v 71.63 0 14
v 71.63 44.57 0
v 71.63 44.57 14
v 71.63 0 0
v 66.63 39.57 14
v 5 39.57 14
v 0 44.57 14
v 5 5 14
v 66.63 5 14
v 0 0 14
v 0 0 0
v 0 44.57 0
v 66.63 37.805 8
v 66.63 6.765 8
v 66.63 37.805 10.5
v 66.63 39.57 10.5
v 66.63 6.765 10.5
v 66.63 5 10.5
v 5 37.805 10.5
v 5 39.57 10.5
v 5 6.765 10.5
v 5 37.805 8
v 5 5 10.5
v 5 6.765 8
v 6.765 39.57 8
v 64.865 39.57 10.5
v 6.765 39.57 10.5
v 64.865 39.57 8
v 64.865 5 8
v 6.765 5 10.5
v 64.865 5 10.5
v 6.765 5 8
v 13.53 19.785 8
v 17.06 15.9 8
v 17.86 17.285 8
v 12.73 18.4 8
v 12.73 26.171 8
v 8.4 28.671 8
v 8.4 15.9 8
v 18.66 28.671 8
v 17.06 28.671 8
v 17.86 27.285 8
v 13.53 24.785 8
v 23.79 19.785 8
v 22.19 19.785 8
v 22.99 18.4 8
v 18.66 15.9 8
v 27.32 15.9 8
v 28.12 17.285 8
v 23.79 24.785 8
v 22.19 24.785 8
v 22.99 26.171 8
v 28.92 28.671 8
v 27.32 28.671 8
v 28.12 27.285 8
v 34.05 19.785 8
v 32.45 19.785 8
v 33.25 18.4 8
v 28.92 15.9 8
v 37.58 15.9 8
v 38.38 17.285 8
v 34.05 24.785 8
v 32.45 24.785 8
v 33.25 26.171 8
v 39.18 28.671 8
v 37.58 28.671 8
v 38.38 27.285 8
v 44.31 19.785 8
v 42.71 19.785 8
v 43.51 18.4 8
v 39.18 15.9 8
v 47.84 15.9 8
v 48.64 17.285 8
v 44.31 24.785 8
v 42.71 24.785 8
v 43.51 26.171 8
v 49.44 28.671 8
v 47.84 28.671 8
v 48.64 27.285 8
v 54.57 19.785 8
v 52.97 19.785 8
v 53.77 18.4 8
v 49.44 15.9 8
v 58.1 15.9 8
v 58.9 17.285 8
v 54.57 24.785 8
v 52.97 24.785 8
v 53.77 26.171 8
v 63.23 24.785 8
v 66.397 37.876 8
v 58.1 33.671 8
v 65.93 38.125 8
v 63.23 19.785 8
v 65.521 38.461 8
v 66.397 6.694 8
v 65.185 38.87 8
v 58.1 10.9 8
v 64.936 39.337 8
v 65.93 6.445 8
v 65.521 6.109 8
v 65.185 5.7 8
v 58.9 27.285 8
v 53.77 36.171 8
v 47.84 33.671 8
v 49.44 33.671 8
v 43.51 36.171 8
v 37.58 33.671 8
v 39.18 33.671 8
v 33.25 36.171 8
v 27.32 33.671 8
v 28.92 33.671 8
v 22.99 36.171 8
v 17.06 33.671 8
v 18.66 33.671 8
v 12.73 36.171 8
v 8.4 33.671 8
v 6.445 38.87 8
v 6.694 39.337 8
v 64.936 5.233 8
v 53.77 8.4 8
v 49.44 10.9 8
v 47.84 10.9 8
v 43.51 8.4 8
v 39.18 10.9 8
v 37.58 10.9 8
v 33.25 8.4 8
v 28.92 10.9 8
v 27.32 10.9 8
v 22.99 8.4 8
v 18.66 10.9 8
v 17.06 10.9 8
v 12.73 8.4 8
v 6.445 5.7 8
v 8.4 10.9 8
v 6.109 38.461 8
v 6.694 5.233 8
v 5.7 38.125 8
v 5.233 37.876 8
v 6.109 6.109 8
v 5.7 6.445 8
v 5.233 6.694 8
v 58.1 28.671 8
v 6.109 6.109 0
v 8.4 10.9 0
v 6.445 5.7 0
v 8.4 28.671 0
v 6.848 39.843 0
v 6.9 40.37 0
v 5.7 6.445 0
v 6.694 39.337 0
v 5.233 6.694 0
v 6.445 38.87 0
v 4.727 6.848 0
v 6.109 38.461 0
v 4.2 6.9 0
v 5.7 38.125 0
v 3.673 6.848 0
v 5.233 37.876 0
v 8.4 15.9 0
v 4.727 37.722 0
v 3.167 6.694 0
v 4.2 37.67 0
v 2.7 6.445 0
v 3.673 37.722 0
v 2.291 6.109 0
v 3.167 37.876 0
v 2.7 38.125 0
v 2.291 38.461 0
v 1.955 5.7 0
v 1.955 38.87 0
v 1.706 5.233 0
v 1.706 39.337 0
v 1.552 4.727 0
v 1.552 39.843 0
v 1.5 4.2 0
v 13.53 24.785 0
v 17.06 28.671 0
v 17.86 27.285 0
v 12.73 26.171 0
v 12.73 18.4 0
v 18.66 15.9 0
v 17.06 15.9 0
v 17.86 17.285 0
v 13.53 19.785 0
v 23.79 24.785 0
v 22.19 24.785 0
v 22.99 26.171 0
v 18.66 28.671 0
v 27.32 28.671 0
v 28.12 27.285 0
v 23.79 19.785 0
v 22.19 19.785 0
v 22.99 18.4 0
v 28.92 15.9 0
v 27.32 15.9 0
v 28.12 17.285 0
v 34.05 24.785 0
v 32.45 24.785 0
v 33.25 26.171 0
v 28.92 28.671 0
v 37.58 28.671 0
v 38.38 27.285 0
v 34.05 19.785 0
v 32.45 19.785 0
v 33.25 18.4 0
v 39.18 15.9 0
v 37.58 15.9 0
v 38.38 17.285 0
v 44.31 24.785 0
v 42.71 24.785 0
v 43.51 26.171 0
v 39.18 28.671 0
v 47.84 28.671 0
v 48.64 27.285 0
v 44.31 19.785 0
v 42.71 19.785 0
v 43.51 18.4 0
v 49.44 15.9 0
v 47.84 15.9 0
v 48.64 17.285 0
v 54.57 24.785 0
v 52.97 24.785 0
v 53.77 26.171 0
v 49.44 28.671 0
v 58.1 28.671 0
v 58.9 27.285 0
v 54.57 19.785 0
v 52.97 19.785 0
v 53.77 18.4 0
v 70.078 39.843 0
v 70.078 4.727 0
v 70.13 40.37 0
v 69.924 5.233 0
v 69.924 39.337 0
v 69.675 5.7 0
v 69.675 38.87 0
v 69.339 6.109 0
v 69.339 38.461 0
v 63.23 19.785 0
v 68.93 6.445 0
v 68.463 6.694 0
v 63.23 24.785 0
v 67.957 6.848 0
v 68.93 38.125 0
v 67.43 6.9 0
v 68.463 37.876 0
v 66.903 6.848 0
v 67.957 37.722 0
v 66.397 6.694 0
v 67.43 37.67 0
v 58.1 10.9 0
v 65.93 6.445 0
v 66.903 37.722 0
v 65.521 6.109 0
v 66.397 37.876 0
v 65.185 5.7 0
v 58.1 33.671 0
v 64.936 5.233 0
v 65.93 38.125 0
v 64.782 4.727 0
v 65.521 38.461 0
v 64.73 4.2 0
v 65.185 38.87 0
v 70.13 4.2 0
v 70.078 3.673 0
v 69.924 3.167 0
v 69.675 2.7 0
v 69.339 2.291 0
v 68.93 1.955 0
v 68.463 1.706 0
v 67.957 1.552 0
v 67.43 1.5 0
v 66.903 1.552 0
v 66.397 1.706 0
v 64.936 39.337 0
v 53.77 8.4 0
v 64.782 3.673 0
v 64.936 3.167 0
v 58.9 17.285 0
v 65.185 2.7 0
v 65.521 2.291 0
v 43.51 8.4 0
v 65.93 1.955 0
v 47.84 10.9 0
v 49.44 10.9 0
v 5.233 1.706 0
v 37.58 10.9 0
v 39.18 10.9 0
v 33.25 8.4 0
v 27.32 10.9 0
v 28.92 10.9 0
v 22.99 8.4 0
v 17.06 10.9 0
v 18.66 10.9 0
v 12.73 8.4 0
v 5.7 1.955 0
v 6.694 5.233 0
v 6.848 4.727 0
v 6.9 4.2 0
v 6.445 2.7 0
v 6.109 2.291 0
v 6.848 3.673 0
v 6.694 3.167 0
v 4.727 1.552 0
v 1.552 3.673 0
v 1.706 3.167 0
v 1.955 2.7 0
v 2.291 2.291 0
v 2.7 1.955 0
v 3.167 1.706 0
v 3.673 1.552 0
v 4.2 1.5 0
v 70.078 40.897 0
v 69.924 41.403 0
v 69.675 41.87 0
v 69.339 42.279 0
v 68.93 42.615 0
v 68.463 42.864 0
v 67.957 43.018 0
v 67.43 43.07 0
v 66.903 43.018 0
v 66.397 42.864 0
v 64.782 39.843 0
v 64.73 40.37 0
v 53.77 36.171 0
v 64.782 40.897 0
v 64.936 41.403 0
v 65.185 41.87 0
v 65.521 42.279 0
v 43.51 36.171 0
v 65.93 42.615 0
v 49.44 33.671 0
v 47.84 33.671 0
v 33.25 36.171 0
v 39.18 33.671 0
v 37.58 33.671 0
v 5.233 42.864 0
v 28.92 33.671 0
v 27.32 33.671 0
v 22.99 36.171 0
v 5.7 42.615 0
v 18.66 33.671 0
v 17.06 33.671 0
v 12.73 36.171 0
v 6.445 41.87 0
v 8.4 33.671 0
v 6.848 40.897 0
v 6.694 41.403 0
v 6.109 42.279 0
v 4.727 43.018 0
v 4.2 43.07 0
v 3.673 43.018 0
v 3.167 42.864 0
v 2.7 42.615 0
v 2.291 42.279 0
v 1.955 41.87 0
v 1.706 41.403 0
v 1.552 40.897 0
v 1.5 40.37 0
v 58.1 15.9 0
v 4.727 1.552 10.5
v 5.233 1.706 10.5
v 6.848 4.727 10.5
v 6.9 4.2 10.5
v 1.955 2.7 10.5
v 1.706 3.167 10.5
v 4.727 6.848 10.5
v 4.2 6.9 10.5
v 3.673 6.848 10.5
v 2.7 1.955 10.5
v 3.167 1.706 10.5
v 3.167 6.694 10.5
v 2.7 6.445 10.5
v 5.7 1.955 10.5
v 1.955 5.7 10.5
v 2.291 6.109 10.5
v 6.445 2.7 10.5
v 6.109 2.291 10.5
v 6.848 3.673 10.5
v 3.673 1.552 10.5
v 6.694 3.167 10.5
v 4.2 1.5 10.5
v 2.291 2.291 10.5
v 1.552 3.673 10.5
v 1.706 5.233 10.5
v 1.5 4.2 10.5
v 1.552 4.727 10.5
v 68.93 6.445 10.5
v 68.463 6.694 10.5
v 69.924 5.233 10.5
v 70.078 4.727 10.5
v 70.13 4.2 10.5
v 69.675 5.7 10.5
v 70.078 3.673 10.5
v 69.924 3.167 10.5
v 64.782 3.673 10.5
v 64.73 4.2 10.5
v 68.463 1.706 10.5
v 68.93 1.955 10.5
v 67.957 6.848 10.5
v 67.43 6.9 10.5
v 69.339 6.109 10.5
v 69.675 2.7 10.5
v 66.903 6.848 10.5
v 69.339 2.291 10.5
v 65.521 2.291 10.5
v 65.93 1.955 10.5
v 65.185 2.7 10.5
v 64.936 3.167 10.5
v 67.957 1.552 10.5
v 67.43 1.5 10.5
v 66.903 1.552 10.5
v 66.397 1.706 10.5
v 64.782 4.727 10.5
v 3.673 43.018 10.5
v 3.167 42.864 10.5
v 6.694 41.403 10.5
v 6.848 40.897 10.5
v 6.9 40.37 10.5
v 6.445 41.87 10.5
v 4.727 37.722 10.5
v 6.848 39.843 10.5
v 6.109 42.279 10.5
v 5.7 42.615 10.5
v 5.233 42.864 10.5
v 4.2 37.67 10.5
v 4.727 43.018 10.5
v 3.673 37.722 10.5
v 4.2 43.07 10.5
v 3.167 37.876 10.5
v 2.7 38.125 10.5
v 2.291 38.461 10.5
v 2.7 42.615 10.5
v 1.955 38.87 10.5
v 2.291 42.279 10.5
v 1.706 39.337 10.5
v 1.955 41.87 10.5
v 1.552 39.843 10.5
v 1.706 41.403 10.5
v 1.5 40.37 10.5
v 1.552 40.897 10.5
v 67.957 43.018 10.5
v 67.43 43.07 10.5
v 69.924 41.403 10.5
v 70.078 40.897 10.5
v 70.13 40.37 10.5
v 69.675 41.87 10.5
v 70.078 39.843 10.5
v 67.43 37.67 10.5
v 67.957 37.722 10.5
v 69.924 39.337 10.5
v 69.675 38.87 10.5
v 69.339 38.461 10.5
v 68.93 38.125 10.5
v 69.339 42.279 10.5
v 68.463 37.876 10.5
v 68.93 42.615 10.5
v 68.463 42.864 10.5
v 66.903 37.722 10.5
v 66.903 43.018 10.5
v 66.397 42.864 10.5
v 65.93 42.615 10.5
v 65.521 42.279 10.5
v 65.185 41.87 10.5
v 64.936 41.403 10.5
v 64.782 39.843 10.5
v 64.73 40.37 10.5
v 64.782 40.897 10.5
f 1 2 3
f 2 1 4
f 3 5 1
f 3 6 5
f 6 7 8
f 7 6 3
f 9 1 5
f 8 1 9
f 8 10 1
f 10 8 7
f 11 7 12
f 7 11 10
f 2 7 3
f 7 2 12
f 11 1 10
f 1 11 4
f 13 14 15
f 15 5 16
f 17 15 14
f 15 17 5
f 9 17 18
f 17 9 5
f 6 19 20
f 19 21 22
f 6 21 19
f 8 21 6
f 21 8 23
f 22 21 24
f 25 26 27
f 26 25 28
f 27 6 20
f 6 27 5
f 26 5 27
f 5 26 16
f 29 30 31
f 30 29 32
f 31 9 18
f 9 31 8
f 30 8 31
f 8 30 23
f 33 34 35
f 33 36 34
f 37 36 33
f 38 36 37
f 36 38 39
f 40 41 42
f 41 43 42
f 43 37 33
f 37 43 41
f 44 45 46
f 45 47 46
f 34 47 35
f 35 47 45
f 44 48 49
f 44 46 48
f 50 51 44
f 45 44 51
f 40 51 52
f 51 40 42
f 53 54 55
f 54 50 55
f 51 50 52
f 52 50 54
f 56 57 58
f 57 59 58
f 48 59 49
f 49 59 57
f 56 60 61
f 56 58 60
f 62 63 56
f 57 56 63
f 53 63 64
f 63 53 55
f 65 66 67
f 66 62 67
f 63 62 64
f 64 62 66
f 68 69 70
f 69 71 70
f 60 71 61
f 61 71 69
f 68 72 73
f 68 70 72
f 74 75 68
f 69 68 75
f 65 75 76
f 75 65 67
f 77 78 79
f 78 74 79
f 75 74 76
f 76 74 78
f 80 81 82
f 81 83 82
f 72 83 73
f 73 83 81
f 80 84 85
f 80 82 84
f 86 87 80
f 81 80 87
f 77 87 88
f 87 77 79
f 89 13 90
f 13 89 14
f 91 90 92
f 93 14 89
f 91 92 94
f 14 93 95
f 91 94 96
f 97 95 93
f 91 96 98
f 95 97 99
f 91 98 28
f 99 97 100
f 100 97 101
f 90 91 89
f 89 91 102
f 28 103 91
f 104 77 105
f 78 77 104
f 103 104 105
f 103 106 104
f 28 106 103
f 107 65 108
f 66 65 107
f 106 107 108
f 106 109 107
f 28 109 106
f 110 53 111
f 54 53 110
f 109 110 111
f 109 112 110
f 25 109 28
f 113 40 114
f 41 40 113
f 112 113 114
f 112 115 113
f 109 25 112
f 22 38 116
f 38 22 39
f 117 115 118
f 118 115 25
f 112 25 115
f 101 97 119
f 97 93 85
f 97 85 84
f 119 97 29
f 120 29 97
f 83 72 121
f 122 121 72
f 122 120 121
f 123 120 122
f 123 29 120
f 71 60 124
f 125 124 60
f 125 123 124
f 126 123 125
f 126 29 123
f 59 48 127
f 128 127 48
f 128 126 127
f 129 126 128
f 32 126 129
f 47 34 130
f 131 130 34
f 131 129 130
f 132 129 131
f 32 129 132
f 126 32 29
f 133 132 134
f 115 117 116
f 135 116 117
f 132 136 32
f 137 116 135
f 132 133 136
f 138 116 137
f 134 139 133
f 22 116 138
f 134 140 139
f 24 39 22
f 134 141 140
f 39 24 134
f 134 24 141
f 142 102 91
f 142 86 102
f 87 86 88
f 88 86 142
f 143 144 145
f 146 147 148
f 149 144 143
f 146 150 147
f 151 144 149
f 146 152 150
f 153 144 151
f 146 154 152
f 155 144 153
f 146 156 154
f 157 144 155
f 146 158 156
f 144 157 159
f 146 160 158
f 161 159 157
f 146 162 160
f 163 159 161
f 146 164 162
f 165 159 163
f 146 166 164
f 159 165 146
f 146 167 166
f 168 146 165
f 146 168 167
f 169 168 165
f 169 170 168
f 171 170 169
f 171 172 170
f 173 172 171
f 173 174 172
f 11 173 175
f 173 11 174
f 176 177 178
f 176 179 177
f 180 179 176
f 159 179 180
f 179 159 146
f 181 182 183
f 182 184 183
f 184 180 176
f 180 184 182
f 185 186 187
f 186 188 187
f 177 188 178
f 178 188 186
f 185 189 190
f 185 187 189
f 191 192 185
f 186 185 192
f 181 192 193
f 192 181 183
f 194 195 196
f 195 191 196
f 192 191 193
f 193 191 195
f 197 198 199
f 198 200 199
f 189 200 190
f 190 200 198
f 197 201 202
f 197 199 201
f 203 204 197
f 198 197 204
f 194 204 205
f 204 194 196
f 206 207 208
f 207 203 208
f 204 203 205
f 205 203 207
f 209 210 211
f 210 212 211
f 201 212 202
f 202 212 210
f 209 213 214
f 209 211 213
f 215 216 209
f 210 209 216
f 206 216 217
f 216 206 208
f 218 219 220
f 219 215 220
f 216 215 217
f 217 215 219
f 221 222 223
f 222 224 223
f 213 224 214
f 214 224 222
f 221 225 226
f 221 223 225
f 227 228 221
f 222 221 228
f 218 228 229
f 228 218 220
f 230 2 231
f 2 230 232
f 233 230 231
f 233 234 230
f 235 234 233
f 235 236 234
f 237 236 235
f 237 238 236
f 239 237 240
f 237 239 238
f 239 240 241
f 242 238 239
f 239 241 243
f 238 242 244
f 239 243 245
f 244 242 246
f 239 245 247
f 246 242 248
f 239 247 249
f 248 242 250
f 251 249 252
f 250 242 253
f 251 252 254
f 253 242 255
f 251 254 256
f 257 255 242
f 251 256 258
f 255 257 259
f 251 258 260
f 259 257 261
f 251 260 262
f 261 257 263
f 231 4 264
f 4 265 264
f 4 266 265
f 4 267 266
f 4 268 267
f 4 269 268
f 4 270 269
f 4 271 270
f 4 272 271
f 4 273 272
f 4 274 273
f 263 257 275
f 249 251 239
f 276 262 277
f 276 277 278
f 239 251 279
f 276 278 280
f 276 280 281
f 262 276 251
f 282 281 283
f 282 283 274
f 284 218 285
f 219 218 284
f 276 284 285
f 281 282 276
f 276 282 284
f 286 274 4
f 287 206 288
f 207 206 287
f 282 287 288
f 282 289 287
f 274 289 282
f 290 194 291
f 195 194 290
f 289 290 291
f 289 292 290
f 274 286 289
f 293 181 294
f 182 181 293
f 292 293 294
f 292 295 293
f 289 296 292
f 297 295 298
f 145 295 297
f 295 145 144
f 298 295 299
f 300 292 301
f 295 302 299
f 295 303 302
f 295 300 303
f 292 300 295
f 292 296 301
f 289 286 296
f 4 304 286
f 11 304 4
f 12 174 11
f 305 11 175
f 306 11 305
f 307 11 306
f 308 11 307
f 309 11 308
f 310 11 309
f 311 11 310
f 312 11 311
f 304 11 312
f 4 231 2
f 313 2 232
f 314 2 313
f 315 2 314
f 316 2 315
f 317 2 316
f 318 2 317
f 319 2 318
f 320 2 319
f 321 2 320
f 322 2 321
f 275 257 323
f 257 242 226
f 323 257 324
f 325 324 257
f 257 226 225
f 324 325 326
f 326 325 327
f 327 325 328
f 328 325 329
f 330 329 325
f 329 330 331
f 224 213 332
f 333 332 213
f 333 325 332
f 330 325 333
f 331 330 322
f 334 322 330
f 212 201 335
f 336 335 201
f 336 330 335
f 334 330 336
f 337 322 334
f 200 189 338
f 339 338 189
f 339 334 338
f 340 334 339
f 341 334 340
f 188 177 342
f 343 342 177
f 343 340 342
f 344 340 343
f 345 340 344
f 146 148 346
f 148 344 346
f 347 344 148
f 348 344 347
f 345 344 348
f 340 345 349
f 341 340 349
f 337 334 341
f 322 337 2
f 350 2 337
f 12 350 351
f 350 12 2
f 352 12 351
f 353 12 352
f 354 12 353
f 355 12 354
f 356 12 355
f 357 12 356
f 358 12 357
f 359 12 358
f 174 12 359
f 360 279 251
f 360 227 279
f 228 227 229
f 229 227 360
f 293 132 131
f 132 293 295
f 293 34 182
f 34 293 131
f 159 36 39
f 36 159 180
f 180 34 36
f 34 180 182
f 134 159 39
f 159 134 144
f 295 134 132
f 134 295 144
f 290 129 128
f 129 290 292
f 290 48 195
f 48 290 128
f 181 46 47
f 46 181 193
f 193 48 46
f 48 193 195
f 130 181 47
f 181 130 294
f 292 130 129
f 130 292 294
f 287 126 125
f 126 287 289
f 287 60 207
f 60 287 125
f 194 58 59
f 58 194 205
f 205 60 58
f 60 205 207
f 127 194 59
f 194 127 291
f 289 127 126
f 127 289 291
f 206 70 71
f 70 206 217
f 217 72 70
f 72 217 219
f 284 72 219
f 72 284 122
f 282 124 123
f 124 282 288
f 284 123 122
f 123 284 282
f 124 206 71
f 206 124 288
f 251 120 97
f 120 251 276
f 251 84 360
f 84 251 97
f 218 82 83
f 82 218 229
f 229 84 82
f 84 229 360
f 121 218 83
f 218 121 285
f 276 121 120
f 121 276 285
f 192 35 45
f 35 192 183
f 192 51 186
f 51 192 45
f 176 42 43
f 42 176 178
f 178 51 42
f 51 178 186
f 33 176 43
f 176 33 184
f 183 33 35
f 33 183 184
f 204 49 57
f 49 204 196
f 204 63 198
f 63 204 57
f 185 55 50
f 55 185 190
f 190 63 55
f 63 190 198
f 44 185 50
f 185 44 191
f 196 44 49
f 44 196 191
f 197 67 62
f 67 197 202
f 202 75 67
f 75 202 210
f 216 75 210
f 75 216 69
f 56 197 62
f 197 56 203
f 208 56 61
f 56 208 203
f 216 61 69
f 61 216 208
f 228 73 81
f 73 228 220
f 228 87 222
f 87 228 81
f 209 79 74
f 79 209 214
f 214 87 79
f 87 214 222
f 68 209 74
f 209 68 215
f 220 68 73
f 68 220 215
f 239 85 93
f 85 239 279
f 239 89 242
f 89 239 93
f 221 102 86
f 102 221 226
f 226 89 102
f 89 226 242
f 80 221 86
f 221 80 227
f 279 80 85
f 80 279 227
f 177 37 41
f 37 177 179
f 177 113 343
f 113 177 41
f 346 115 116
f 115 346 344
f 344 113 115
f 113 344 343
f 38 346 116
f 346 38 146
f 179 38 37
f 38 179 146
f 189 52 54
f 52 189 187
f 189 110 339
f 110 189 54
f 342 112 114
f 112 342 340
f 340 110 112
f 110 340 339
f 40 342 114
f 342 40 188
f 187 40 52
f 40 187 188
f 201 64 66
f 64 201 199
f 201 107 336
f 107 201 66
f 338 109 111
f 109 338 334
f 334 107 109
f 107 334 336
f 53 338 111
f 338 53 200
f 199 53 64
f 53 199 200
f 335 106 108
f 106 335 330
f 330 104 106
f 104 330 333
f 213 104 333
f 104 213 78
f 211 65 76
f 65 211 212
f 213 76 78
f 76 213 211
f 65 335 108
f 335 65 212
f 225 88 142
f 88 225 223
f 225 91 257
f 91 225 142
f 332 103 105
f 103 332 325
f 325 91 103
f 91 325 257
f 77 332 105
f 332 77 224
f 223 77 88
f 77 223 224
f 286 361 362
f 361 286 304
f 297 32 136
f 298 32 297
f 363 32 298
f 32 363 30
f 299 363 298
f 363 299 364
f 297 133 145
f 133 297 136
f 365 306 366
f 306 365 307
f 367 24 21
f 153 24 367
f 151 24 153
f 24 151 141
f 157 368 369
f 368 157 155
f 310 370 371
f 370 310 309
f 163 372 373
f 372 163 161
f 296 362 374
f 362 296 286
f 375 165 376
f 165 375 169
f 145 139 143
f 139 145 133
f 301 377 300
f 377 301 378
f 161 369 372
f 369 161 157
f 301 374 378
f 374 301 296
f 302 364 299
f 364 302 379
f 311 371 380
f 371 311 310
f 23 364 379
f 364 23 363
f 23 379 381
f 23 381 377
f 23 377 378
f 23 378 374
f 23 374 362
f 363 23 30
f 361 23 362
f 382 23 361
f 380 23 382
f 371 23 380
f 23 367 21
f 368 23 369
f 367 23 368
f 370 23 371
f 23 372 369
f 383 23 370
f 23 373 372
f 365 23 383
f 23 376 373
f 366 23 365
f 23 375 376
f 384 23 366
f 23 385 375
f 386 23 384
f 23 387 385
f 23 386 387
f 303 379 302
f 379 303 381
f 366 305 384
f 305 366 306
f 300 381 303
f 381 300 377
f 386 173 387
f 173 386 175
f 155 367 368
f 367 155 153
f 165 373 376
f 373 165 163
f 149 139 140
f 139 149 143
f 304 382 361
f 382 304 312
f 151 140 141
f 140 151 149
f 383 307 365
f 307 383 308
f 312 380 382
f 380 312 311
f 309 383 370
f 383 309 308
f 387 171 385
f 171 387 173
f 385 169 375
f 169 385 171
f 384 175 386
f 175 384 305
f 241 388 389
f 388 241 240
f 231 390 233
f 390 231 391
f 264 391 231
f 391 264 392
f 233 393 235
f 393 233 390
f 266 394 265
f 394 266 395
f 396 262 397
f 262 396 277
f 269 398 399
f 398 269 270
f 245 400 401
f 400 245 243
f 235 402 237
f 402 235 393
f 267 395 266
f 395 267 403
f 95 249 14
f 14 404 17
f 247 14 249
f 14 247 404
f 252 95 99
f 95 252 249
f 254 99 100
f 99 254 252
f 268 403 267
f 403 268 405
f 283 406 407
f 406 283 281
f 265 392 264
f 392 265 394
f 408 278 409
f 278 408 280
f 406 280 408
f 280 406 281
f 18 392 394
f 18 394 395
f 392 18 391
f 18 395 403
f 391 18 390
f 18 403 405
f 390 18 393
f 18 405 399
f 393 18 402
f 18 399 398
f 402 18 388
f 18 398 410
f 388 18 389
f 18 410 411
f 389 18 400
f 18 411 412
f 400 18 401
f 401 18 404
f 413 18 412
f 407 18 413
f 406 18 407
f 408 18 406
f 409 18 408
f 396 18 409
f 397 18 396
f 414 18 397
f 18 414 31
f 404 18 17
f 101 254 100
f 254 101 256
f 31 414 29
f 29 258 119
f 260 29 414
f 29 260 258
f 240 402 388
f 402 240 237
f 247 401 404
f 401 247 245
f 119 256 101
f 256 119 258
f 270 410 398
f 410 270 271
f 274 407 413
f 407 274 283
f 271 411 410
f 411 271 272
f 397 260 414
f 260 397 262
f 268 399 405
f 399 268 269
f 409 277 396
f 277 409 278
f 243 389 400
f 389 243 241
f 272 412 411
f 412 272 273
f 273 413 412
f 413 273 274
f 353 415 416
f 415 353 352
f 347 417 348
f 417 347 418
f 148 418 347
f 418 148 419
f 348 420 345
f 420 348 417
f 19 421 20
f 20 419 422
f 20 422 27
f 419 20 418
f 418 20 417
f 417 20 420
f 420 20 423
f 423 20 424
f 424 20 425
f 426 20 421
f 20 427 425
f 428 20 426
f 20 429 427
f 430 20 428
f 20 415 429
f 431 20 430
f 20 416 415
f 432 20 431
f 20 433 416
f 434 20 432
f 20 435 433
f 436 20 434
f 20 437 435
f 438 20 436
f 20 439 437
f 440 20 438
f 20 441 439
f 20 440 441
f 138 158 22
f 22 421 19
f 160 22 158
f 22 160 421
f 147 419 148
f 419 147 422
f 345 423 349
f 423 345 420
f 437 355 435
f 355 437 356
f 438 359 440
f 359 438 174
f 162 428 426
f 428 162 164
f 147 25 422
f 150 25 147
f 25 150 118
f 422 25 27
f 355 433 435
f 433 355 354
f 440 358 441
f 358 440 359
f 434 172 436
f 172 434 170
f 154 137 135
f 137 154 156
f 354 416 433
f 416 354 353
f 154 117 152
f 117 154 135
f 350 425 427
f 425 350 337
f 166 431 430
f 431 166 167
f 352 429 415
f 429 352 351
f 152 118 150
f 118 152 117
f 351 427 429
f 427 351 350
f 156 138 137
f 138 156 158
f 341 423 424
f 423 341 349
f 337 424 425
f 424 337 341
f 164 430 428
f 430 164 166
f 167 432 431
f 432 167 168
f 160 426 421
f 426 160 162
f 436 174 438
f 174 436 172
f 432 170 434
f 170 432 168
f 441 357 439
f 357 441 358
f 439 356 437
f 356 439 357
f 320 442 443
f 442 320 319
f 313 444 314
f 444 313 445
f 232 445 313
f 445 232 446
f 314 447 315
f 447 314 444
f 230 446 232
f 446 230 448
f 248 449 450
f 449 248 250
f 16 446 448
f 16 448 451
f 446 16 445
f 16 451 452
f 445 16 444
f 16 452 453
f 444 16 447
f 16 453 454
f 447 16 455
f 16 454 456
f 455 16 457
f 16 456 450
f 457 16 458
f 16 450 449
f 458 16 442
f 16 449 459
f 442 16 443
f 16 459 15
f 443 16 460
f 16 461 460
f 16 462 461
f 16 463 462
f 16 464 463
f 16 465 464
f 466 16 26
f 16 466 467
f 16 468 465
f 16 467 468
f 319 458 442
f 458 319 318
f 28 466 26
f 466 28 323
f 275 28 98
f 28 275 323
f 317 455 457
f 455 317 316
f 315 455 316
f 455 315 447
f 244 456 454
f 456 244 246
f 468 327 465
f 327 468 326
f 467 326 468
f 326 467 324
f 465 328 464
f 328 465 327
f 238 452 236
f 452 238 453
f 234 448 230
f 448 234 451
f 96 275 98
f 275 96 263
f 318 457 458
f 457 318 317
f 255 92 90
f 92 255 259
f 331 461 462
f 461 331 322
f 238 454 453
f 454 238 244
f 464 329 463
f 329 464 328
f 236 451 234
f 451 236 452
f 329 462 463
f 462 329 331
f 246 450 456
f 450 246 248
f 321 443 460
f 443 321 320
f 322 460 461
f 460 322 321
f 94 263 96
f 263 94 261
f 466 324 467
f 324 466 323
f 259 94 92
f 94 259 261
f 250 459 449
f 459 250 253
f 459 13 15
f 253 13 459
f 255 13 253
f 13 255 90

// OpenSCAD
$fn = 32;

// ----------------------------------------------------------------------
// Honeycomb panel: 71.63 x 44.57 mm, 15 cells of 10 mm
// ----------------------------------------------------------------------

// --- parameters (mm) ---
panel_w = 71.63;          // panel width
panel_d = 44.57;          // panel depth
thick = 8;                // panel thickness
cell_r = 5;               // hex cell circumradius
pitch = 10.26;            // hex cell pitch (centre to centre)
web = 1.6;                // web between the cells
columns = 5;              // columns of cells
rows = 3;                 // rows of cells
cell_count = 15;          // total cells
shift_x = 12.73;          // first cell offset in x
shift_y = 13.4;           // first cell offset in y
mount_d = 5.4;            // corner mounting holes
hole_off = 4.2;           // mounting hole offset from the corners
rim_h = 14;               // rim height
rim_t = 5;                // rim wall thickness

difference() {
  union() {
    cube([panel_w, panel_d, thick]);
    /* rim around the panel, sunk 1 mm into the plate */
    translate([0, 0, thick - 1]) difference() {
      cube([panel_w, panel_d, rim_h - thick + 1]);
      translate([rim_t, rim_t, -2.5]) cube([panel_w - 2 * rim_t, panel_d - 2 * rim_t, rim_h - thick + 6]);
    }
  }
  /* hexagonal cells, point-up, cut right through the plate */
  for (row = [0 : rows - 1]) {
    for (col = [0 : columns - 1]) {
      translate([shift_x + col * pitch + (row % 2) * pitch / 2, shift_y + row * pitch * 0.866025, -2.5]) rotate([0, 0, 30]) cylinder(h = thick + 5, d = 2 * cell_r, $fn = 6);
    }
  }
  /* corner mounting holes, clear of the outer cell web */
  translate([4.2, 4.2, -2.5]) cylinder(h = thick + 5, d = mount_d);
  translate([67.43, 4.2, -2.5]) cylinder(h = thick + 5, d = mount_d);
  translate([4.2, 40.37, -2.5]) cylinder(h = thick + 5, d = mount_d);
  translate([67.43, 40.37, -2.5]) cylinder(h = thick + 5, d = mount_d);
}
